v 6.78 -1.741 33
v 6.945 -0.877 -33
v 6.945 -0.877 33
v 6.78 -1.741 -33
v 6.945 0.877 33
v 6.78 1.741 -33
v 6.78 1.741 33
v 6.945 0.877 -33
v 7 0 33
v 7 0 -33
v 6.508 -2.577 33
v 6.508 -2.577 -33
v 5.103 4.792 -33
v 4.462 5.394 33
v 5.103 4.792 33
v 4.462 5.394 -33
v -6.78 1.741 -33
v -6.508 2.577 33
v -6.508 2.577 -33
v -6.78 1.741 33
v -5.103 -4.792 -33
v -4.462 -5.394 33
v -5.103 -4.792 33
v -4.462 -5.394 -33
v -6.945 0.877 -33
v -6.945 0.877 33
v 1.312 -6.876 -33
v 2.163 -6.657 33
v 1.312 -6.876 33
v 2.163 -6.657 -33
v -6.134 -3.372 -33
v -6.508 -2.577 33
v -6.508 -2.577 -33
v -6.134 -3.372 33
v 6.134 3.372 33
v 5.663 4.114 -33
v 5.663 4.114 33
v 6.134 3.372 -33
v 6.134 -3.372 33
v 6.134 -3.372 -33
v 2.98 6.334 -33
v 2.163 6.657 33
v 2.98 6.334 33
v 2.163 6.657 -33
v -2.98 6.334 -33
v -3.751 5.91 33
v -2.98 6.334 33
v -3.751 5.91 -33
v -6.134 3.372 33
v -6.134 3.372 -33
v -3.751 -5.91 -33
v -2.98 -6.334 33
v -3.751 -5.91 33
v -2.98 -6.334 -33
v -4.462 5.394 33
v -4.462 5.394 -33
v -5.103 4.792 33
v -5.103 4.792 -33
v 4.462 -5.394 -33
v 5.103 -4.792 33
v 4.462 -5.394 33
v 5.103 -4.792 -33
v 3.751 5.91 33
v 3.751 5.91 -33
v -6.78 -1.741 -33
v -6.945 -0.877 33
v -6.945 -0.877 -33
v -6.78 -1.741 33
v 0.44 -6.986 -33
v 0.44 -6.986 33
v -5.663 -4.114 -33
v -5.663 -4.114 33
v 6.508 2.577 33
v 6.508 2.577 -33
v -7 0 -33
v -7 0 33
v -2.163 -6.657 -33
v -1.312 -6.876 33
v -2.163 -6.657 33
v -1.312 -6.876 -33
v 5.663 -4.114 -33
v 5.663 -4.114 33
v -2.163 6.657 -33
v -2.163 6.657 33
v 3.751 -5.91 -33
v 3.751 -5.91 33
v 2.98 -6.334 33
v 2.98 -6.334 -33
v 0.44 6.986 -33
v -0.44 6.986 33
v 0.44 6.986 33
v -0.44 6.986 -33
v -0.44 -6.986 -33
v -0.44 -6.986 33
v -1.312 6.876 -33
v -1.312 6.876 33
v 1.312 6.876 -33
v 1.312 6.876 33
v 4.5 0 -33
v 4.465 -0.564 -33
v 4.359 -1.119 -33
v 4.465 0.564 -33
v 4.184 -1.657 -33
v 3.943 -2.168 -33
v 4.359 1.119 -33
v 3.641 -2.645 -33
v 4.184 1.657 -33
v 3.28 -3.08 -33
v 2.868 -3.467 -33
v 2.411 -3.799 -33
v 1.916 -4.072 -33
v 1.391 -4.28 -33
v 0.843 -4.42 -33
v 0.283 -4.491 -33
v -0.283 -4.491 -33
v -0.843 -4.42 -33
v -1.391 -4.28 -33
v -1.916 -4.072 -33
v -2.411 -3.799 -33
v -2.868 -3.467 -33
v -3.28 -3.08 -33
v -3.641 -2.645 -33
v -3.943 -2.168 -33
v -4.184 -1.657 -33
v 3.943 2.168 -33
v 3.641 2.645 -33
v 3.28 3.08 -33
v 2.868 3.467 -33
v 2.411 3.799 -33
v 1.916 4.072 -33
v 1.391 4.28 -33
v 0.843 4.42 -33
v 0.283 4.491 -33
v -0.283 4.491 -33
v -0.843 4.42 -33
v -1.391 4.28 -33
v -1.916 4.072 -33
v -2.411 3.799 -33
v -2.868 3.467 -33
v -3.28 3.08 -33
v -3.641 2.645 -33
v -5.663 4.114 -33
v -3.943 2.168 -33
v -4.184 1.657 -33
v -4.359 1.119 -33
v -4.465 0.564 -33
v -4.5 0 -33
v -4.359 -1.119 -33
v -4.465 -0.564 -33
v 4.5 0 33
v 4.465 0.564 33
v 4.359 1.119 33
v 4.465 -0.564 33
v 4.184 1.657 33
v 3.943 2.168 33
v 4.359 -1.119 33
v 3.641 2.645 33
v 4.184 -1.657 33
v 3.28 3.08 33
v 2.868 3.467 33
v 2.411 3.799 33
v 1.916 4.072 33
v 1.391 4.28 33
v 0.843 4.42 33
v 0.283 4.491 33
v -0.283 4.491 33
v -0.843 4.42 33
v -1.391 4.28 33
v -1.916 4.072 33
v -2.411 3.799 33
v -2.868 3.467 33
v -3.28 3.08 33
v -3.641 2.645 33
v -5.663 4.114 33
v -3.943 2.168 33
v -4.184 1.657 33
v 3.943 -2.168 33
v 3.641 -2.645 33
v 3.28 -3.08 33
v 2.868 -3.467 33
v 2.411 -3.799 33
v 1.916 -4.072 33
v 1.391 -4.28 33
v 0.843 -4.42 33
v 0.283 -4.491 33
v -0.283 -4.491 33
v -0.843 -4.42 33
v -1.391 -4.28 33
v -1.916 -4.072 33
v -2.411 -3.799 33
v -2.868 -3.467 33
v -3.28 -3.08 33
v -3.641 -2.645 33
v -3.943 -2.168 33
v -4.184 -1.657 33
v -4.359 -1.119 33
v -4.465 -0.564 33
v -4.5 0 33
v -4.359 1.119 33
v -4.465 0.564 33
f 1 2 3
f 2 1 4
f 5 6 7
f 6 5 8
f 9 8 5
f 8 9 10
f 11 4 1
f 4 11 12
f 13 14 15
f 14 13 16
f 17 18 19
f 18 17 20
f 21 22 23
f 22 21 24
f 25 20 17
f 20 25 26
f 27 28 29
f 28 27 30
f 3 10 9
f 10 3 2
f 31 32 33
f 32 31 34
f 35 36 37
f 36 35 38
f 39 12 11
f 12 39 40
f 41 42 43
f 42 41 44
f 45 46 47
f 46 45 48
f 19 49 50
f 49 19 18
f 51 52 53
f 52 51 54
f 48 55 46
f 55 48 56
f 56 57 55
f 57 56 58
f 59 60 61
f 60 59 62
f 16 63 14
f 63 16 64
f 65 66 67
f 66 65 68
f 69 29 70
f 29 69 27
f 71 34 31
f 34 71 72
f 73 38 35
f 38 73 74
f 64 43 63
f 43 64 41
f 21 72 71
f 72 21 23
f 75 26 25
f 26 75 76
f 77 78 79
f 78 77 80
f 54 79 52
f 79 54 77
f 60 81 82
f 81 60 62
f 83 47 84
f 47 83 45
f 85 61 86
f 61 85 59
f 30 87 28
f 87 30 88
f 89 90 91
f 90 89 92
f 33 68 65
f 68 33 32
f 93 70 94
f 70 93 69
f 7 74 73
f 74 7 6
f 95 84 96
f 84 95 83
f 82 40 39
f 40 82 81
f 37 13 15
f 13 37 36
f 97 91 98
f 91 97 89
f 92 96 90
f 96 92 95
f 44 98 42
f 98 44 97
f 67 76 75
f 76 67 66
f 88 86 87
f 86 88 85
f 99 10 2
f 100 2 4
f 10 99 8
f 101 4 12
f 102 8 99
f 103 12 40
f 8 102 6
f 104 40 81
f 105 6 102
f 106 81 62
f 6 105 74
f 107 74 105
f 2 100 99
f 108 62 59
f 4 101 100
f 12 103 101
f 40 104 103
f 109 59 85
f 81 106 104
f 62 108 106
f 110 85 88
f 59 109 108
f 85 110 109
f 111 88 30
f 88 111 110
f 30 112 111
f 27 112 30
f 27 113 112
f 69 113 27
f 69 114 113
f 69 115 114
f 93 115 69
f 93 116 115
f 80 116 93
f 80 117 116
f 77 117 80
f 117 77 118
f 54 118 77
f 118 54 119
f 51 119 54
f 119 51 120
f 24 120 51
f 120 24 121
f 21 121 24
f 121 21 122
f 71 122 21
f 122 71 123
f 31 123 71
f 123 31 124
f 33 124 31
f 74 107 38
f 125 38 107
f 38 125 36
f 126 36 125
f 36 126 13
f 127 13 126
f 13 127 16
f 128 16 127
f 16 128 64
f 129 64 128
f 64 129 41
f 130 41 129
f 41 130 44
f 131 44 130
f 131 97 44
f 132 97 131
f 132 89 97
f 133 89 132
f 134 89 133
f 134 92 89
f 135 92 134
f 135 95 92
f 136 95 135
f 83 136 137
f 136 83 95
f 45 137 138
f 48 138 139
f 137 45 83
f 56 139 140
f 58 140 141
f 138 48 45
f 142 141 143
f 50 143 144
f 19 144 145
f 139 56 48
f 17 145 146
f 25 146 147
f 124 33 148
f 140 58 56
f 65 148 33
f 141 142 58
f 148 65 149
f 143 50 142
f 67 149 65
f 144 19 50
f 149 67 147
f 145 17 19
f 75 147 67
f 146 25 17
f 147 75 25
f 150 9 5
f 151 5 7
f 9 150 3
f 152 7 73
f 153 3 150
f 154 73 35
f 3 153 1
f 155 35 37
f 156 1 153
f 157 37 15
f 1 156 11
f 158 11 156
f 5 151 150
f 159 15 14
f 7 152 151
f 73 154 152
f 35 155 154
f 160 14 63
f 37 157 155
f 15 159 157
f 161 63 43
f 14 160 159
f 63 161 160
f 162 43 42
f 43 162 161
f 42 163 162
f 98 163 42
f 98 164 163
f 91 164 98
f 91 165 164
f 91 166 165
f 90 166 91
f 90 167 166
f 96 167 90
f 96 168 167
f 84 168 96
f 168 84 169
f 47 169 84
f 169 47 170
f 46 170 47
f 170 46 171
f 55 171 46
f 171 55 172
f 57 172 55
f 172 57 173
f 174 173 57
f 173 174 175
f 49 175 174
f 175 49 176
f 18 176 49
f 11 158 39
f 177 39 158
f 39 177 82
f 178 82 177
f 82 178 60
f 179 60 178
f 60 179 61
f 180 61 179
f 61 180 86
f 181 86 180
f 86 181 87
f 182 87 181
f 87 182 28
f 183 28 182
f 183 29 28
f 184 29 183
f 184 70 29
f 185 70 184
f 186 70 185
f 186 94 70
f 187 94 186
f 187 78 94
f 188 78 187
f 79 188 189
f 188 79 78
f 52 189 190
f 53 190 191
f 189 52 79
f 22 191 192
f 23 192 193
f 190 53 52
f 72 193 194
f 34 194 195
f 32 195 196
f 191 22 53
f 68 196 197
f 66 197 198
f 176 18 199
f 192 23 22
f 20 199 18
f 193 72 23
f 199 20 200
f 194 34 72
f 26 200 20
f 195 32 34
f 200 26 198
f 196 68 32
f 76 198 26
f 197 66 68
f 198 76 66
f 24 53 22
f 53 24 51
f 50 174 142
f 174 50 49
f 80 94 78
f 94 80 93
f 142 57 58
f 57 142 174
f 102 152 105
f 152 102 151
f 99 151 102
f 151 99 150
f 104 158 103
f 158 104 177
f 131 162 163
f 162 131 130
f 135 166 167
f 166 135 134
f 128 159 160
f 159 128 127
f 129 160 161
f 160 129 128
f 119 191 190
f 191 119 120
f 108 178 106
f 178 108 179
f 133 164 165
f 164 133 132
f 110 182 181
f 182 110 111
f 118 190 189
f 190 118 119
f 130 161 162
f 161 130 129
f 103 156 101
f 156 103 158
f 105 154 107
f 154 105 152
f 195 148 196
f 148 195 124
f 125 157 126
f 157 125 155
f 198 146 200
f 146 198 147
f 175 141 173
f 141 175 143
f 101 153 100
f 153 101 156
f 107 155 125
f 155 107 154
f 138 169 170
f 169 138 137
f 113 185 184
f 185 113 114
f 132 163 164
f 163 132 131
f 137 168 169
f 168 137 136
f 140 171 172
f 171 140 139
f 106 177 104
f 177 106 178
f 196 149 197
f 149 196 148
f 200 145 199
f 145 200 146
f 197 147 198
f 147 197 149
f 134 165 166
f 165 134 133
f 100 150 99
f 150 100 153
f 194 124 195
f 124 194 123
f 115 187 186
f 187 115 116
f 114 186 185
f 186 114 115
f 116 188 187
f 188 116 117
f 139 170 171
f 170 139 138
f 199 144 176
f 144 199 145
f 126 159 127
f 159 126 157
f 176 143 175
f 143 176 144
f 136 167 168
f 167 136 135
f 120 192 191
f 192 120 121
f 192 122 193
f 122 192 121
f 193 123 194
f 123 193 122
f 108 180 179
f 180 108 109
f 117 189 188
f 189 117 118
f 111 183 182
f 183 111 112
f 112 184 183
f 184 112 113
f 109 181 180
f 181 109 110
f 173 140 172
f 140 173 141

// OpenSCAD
$fn = 50;


difference() {
	union() {
		translate(v = [0, 0, -33.0000000000]) {
			cylinder(h = 66, r = 7.0000000000);
		}
	}
	union() {
		translate(v = [0, 0, -100.0000000000]) {
			cylinder(h = 200, r = 4.5000000000);
		}
	}
}
